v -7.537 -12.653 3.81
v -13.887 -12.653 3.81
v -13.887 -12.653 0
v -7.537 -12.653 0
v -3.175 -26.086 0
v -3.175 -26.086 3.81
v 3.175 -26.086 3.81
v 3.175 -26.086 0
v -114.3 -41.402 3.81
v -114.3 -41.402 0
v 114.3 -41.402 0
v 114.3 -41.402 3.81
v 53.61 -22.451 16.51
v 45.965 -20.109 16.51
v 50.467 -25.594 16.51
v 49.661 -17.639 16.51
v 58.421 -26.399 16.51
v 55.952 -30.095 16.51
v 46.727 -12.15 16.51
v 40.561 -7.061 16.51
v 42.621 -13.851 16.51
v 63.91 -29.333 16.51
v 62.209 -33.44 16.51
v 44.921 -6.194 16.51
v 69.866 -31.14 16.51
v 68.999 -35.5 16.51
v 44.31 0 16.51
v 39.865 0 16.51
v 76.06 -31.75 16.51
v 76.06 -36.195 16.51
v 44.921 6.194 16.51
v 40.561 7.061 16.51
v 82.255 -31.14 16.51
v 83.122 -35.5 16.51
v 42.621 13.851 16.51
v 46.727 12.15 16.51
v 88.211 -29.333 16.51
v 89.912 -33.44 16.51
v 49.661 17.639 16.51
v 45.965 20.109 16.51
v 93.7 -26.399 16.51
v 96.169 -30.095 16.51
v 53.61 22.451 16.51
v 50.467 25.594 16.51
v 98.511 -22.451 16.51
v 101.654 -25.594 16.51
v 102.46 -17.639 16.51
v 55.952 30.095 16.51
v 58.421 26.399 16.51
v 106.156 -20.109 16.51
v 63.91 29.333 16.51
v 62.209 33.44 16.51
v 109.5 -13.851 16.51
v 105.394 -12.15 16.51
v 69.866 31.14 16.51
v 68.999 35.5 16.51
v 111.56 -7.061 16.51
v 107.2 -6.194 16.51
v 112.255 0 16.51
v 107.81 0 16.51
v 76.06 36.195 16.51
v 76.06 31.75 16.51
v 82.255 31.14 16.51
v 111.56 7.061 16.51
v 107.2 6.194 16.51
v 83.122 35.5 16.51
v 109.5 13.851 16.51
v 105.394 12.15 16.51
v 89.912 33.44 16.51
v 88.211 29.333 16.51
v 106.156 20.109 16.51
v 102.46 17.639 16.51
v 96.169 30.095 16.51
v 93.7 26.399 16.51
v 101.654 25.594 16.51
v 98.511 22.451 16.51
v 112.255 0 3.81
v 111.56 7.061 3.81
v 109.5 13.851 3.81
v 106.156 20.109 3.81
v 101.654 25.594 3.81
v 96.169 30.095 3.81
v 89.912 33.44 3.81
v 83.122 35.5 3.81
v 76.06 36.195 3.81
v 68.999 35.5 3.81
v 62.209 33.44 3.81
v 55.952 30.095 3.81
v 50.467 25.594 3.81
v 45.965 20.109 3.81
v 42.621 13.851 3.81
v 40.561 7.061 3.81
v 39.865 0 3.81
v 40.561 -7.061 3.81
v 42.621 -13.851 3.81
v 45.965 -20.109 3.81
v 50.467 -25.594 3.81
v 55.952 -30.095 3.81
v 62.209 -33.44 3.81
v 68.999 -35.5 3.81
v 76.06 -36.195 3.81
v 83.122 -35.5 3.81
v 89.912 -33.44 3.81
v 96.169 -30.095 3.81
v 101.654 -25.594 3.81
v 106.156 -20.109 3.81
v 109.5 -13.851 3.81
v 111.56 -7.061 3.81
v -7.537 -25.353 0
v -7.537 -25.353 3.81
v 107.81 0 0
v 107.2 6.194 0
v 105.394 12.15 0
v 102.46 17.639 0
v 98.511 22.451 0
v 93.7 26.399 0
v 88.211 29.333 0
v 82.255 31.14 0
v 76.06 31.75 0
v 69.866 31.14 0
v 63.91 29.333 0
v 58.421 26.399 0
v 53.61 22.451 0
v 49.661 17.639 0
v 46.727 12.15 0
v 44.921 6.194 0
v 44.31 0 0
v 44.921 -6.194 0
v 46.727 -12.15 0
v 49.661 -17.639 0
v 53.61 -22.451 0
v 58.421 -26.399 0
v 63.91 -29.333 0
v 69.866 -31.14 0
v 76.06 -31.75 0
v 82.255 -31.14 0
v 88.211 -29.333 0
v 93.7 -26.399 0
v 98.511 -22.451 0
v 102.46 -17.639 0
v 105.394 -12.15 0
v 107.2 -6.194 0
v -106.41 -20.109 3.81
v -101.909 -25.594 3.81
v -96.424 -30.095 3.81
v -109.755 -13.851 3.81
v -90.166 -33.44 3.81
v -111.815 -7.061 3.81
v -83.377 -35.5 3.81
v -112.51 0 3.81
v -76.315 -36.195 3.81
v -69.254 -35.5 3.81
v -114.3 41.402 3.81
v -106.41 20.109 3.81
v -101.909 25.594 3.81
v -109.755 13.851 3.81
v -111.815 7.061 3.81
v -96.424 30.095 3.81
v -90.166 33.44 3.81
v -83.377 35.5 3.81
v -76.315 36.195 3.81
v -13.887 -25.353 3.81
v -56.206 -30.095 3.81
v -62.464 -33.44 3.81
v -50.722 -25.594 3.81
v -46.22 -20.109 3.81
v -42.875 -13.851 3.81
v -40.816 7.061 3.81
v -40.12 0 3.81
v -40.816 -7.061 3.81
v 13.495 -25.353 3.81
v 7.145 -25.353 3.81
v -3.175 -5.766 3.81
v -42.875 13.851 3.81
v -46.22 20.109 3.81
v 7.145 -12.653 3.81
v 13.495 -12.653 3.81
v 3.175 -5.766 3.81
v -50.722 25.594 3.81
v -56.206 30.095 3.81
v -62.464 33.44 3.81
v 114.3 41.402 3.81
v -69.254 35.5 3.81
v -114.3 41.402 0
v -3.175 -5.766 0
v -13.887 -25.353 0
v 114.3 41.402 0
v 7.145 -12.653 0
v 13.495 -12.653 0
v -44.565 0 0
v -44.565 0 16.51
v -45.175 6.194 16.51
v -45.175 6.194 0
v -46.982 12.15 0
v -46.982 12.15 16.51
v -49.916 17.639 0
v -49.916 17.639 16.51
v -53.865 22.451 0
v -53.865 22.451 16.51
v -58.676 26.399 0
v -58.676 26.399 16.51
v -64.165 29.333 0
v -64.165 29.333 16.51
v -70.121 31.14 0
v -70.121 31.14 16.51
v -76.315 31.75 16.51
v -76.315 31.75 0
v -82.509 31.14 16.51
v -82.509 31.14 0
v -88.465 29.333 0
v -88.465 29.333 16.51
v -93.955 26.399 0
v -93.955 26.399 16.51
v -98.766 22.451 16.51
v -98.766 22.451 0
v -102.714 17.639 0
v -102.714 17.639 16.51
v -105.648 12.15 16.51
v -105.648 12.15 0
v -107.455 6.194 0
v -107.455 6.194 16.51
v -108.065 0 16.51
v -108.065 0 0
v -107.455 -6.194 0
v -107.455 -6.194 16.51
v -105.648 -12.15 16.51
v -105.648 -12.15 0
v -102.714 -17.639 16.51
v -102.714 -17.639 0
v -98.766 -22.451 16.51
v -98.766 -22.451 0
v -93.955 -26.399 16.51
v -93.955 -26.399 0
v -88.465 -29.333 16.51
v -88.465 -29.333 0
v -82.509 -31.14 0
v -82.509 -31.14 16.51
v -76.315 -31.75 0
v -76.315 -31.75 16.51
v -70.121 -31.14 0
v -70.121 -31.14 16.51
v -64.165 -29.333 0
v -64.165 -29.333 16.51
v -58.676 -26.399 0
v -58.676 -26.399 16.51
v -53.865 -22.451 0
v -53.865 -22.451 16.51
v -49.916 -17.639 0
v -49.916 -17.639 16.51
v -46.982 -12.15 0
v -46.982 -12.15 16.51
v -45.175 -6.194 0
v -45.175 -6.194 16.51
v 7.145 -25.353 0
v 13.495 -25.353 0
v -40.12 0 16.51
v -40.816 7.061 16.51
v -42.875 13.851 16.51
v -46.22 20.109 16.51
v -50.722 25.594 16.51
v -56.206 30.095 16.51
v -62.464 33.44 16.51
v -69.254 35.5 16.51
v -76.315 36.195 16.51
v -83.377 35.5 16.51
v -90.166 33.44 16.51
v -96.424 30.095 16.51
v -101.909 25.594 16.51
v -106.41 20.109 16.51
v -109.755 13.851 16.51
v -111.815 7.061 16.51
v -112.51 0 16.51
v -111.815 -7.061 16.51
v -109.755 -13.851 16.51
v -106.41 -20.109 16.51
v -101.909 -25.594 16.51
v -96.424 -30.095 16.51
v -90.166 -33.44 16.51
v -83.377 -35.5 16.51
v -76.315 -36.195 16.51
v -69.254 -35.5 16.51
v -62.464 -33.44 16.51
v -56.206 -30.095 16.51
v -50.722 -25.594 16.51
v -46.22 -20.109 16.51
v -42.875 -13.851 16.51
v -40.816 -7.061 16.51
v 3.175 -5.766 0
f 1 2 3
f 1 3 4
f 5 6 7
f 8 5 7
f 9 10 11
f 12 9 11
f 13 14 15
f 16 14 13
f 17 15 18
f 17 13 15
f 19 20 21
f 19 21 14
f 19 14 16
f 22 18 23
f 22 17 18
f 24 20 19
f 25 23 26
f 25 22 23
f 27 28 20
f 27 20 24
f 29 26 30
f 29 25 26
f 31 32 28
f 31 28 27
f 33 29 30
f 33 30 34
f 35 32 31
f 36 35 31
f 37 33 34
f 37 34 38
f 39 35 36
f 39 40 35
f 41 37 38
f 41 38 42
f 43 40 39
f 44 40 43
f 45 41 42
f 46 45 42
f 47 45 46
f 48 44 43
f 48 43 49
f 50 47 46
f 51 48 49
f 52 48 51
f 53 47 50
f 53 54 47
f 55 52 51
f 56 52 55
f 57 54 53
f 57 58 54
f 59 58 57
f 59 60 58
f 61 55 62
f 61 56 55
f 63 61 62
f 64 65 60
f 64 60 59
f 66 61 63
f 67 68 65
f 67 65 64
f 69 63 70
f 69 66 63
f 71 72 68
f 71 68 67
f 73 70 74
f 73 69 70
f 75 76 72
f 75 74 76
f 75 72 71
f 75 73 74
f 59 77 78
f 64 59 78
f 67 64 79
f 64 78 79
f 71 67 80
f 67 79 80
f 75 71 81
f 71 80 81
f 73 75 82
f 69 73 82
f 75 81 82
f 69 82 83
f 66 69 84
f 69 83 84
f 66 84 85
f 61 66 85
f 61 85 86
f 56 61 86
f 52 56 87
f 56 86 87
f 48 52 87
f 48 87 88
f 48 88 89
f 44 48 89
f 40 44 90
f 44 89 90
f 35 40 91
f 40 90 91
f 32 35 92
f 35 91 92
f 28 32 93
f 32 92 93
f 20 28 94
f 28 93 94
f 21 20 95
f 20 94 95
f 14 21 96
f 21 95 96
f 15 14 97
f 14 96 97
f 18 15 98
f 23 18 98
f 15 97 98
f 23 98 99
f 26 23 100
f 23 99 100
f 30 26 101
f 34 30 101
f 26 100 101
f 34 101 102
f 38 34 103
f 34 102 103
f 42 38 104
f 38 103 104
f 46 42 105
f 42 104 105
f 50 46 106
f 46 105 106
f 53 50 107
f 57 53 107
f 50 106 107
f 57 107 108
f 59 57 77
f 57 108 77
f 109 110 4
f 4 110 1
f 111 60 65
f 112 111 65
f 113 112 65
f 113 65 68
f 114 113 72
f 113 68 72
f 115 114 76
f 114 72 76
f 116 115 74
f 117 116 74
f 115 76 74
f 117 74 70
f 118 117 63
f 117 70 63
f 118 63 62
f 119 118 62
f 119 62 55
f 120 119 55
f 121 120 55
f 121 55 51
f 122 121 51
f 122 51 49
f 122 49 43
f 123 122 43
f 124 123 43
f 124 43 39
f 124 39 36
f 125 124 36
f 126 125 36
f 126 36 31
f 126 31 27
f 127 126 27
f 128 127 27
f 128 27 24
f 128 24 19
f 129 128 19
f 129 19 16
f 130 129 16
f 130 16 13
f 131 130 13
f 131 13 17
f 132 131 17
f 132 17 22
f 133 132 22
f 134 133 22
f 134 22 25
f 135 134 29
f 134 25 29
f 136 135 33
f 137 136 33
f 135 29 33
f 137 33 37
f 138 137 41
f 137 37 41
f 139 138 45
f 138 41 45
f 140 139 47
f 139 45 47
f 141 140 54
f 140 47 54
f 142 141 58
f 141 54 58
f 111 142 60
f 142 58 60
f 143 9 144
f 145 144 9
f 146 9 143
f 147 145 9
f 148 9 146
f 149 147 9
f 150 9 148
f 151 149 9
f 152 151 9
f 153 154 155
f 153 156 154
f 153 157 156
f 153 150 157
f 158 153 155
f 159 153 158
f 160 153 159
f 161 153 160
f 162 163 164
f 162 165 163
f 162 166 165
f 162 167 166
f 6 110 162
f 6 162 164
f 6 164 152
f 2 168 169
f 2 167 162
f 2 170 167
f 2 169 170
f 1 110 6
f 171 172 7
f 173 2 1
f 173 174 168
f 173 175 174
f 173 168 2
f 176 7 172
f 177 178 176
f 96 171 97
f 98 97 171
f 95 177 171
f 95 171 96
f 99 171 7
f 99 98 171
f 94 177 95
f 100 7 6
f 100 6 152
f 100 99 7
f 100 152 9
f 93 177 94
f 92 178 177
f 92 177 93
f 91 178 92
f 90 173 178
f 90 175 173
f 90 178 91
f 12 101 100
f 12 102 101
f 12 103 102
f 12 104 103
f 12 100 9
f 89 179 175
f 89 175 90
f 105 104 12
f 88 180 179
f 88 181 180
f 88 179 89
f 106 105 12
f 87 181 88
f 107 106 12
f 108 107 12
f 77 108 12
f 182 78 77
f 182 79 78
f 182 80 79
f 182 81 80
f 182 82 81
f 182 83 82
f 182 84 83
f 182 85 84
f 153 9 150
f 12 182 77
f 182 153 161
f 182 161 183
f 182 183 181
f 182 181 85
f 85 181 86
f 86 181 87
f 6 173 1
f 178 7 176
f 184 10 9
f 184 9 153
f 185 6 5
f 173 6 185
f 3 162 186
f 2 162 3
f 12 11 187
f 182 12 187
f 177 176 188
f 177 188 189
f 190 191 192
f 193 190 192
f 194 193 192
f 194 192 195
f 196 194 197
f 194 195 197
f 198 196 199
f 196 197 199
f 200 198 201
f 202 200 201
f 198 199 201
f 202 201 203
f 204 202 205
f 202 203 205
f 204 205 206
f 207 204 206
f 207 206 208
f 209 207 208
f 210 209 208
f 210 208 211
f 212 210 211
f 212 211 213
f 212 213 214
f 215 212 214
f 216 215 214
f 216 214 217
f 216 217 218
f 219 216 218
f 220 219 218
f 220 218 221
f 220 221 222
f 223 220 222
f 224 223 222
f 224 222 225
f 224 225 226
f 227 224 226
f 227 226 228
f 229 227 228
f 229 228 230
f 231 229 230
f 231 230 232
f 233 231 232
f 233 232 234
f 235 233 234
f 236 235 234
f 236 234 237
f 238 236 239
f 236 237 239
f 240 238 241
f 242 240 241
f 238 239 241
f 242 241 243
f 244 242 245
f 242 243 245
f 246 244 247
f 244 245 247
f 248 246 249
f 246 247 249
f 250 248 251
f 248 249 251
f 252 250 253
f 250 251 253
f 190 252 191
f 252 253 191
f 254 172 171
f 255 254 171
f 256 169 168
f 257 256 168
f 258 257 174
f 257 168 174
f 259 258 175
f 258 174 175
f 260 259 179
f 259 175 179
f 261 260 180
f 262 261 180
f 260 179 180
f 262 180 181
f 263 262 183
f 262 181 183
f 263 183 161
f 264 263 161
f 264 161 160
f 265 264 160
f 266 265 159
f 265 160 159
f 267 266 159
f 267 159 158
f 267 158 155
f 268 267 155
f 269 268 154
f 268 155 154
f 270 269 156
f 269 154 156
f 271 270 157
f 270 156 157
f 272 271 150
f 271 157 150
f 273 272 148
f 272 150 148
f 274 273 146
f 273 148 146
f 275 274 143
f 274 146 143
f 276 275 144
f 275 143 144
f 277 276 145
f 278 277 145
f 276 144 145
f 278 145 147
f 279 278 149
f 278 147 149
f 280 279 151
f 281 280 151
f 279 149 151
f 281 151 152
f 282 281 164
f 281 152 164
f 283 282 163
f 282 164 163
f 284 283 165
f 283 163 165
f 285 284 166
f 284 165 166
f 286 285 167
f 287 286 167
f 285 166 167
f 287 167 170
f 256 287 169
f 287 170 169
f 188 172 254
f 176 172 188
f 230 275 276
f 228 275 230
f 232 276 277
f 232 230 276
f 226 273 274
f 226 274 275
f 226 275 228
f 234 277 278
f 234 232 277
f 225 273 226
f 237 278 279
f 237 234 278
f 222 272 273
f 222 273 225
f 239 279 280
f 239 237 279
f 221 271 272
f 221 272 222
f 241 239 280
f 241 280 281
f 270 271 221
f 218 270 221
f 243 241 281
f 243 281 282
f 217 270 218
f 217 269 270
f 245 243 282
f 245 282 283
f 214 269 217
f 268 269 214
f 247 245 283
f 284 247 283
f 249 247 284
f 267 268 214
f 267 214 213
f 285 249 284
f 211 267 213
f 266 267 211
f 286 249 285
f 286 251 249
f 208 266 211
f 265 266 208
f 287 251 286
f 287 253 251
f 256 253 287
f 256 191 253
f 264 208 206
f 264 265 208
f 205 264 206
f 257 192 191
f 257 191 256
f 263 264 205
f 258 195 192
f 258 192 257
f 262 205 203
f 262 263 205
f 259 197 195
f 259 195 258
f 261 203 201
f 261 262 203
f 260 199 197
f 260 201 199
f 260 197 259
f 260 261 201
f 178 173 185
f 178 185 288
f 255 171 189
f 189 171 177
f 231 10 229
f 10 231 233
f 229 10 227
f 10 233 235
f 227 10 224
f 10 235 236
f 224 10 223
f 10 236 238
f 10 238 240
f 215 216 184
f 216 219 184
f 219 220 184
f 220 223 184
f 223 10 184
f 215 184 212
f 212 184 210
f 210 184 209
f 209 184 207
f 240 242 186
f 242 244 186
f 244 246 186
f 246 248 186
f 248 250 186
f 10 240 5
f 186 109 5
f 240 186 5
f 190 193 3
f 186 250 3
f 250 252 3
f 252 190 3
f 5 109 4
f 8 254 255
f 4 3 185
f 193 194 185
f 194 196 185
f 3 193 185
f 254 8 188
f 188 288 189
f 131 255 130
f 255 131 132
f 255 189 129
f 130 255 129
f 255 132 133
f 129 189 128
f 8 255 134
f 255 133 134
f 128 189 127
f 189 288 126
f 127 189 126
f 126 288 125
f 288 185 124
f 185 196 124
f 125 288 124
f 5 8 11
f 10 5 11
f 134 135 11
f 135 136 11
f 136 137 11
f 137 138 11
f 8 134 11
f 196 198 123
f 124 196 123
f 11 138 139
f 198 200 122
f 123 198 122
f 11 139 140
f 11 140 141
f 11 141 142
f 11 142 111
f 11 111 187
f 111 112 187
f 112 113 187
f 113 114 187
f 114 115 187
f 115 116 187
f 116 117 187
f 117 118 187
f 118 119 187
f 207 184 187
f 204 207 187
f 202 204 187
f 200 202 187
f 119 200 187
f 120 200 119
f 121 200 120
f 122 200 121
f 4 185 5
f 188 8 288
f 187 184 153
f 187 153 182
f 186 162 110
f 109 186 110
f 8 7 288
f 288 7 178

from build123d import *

# Parameters (mm, degrees)
F0_W      = 228.6
F0_H      = 82.804
F1_DEPTH  = 3.81
F2_R      = 36.195
F3_DEPTH  = 12.7
F4_R      = 36.195
F5_DEPTH  = 12.7
F6_R      = 31.75
F7_DEPTH  = 17.78
F8_R      = 31.75
F9_DEPTH  = 17.78
F10_W     = 6.35
F10_H     = 20.32
F11_DEPTH = 7.62
F12_W     = 6.35
F12_H     = 12.7
F13_DEPTH = 7.62
F14_W     = 6.35
F14_H     = 12.7
F15_DEPTH = 7.62


with BuildPart() as f1:
    # F0 (on Top) → F1 (new body)
    with BuildSketch(Plane.XY):
        Rectangle(F0_W, F0_H)
    extrude(amount=F1_DEPTH)

    # F2 (on face) → F3 (join)
    with BuildSketch(Plane.XY.offset(3.81)):
        with Locations((-76.315269, 0)):
            Circle(F2_R)
    extrude(amount=F3_DEPTH)

    # F4 (on face) → F5 (join)
    with BuildSketch(Plane.XY.offset(3.81)):
        with Locations((76.060459, 0)):
            Circle(F4_R)
    extrude(amount=F5_DEPTH)

    # F6 (on face) → F7 (cut)
    with BuildSketch(Plane.XY.offset(16.51)):
        with Locations((-76.315269, 0)):
            Circle(F6_R)
    extrude(amount=-F7_DEPTH, mode=Mode.SUBTRACT)

    # F8 (on face) → F9 (cut)
    with BuildSketch(Plane.XY.offset(16.51)):
        with Locations((76.060459, 0)):
            Circle(F8_R)
    extrude(amount=-F9_DEPTH, mode=Mode.SUBTRACT)

    # F10 (on face) → F11 (cut)
    with BuildSketch(Plane.XY.offset(3.81)):
        with Locations((0, -15.925558)):
            Rectangle(F10_W, F10_H)
    extrude(amount=-F11_DEPTH, mode=Mode.SUBTRACT)

    # F12 (on face) → F13 (cut)
    with BuildSketch(Plane.XY.offset(3.81)):
        with Locations((-10.712087, -19.003488)):
            Rectangle(F12_W, F12_H)
    extrude(amount=-F13_DEPTH, mode=Mode.SUBTRACT)

    # F14 (on face) → F15 (cut)
    with BuildSketch(Plane.XY.offset(3.81)):
        with Locations((10.31976, -19.003488)):
            Rectangle(F14_W, F14_H)
    extrude(amount=-F15_DEPTH, mode=Mode.SUBTRACT)


solid = f1.part
